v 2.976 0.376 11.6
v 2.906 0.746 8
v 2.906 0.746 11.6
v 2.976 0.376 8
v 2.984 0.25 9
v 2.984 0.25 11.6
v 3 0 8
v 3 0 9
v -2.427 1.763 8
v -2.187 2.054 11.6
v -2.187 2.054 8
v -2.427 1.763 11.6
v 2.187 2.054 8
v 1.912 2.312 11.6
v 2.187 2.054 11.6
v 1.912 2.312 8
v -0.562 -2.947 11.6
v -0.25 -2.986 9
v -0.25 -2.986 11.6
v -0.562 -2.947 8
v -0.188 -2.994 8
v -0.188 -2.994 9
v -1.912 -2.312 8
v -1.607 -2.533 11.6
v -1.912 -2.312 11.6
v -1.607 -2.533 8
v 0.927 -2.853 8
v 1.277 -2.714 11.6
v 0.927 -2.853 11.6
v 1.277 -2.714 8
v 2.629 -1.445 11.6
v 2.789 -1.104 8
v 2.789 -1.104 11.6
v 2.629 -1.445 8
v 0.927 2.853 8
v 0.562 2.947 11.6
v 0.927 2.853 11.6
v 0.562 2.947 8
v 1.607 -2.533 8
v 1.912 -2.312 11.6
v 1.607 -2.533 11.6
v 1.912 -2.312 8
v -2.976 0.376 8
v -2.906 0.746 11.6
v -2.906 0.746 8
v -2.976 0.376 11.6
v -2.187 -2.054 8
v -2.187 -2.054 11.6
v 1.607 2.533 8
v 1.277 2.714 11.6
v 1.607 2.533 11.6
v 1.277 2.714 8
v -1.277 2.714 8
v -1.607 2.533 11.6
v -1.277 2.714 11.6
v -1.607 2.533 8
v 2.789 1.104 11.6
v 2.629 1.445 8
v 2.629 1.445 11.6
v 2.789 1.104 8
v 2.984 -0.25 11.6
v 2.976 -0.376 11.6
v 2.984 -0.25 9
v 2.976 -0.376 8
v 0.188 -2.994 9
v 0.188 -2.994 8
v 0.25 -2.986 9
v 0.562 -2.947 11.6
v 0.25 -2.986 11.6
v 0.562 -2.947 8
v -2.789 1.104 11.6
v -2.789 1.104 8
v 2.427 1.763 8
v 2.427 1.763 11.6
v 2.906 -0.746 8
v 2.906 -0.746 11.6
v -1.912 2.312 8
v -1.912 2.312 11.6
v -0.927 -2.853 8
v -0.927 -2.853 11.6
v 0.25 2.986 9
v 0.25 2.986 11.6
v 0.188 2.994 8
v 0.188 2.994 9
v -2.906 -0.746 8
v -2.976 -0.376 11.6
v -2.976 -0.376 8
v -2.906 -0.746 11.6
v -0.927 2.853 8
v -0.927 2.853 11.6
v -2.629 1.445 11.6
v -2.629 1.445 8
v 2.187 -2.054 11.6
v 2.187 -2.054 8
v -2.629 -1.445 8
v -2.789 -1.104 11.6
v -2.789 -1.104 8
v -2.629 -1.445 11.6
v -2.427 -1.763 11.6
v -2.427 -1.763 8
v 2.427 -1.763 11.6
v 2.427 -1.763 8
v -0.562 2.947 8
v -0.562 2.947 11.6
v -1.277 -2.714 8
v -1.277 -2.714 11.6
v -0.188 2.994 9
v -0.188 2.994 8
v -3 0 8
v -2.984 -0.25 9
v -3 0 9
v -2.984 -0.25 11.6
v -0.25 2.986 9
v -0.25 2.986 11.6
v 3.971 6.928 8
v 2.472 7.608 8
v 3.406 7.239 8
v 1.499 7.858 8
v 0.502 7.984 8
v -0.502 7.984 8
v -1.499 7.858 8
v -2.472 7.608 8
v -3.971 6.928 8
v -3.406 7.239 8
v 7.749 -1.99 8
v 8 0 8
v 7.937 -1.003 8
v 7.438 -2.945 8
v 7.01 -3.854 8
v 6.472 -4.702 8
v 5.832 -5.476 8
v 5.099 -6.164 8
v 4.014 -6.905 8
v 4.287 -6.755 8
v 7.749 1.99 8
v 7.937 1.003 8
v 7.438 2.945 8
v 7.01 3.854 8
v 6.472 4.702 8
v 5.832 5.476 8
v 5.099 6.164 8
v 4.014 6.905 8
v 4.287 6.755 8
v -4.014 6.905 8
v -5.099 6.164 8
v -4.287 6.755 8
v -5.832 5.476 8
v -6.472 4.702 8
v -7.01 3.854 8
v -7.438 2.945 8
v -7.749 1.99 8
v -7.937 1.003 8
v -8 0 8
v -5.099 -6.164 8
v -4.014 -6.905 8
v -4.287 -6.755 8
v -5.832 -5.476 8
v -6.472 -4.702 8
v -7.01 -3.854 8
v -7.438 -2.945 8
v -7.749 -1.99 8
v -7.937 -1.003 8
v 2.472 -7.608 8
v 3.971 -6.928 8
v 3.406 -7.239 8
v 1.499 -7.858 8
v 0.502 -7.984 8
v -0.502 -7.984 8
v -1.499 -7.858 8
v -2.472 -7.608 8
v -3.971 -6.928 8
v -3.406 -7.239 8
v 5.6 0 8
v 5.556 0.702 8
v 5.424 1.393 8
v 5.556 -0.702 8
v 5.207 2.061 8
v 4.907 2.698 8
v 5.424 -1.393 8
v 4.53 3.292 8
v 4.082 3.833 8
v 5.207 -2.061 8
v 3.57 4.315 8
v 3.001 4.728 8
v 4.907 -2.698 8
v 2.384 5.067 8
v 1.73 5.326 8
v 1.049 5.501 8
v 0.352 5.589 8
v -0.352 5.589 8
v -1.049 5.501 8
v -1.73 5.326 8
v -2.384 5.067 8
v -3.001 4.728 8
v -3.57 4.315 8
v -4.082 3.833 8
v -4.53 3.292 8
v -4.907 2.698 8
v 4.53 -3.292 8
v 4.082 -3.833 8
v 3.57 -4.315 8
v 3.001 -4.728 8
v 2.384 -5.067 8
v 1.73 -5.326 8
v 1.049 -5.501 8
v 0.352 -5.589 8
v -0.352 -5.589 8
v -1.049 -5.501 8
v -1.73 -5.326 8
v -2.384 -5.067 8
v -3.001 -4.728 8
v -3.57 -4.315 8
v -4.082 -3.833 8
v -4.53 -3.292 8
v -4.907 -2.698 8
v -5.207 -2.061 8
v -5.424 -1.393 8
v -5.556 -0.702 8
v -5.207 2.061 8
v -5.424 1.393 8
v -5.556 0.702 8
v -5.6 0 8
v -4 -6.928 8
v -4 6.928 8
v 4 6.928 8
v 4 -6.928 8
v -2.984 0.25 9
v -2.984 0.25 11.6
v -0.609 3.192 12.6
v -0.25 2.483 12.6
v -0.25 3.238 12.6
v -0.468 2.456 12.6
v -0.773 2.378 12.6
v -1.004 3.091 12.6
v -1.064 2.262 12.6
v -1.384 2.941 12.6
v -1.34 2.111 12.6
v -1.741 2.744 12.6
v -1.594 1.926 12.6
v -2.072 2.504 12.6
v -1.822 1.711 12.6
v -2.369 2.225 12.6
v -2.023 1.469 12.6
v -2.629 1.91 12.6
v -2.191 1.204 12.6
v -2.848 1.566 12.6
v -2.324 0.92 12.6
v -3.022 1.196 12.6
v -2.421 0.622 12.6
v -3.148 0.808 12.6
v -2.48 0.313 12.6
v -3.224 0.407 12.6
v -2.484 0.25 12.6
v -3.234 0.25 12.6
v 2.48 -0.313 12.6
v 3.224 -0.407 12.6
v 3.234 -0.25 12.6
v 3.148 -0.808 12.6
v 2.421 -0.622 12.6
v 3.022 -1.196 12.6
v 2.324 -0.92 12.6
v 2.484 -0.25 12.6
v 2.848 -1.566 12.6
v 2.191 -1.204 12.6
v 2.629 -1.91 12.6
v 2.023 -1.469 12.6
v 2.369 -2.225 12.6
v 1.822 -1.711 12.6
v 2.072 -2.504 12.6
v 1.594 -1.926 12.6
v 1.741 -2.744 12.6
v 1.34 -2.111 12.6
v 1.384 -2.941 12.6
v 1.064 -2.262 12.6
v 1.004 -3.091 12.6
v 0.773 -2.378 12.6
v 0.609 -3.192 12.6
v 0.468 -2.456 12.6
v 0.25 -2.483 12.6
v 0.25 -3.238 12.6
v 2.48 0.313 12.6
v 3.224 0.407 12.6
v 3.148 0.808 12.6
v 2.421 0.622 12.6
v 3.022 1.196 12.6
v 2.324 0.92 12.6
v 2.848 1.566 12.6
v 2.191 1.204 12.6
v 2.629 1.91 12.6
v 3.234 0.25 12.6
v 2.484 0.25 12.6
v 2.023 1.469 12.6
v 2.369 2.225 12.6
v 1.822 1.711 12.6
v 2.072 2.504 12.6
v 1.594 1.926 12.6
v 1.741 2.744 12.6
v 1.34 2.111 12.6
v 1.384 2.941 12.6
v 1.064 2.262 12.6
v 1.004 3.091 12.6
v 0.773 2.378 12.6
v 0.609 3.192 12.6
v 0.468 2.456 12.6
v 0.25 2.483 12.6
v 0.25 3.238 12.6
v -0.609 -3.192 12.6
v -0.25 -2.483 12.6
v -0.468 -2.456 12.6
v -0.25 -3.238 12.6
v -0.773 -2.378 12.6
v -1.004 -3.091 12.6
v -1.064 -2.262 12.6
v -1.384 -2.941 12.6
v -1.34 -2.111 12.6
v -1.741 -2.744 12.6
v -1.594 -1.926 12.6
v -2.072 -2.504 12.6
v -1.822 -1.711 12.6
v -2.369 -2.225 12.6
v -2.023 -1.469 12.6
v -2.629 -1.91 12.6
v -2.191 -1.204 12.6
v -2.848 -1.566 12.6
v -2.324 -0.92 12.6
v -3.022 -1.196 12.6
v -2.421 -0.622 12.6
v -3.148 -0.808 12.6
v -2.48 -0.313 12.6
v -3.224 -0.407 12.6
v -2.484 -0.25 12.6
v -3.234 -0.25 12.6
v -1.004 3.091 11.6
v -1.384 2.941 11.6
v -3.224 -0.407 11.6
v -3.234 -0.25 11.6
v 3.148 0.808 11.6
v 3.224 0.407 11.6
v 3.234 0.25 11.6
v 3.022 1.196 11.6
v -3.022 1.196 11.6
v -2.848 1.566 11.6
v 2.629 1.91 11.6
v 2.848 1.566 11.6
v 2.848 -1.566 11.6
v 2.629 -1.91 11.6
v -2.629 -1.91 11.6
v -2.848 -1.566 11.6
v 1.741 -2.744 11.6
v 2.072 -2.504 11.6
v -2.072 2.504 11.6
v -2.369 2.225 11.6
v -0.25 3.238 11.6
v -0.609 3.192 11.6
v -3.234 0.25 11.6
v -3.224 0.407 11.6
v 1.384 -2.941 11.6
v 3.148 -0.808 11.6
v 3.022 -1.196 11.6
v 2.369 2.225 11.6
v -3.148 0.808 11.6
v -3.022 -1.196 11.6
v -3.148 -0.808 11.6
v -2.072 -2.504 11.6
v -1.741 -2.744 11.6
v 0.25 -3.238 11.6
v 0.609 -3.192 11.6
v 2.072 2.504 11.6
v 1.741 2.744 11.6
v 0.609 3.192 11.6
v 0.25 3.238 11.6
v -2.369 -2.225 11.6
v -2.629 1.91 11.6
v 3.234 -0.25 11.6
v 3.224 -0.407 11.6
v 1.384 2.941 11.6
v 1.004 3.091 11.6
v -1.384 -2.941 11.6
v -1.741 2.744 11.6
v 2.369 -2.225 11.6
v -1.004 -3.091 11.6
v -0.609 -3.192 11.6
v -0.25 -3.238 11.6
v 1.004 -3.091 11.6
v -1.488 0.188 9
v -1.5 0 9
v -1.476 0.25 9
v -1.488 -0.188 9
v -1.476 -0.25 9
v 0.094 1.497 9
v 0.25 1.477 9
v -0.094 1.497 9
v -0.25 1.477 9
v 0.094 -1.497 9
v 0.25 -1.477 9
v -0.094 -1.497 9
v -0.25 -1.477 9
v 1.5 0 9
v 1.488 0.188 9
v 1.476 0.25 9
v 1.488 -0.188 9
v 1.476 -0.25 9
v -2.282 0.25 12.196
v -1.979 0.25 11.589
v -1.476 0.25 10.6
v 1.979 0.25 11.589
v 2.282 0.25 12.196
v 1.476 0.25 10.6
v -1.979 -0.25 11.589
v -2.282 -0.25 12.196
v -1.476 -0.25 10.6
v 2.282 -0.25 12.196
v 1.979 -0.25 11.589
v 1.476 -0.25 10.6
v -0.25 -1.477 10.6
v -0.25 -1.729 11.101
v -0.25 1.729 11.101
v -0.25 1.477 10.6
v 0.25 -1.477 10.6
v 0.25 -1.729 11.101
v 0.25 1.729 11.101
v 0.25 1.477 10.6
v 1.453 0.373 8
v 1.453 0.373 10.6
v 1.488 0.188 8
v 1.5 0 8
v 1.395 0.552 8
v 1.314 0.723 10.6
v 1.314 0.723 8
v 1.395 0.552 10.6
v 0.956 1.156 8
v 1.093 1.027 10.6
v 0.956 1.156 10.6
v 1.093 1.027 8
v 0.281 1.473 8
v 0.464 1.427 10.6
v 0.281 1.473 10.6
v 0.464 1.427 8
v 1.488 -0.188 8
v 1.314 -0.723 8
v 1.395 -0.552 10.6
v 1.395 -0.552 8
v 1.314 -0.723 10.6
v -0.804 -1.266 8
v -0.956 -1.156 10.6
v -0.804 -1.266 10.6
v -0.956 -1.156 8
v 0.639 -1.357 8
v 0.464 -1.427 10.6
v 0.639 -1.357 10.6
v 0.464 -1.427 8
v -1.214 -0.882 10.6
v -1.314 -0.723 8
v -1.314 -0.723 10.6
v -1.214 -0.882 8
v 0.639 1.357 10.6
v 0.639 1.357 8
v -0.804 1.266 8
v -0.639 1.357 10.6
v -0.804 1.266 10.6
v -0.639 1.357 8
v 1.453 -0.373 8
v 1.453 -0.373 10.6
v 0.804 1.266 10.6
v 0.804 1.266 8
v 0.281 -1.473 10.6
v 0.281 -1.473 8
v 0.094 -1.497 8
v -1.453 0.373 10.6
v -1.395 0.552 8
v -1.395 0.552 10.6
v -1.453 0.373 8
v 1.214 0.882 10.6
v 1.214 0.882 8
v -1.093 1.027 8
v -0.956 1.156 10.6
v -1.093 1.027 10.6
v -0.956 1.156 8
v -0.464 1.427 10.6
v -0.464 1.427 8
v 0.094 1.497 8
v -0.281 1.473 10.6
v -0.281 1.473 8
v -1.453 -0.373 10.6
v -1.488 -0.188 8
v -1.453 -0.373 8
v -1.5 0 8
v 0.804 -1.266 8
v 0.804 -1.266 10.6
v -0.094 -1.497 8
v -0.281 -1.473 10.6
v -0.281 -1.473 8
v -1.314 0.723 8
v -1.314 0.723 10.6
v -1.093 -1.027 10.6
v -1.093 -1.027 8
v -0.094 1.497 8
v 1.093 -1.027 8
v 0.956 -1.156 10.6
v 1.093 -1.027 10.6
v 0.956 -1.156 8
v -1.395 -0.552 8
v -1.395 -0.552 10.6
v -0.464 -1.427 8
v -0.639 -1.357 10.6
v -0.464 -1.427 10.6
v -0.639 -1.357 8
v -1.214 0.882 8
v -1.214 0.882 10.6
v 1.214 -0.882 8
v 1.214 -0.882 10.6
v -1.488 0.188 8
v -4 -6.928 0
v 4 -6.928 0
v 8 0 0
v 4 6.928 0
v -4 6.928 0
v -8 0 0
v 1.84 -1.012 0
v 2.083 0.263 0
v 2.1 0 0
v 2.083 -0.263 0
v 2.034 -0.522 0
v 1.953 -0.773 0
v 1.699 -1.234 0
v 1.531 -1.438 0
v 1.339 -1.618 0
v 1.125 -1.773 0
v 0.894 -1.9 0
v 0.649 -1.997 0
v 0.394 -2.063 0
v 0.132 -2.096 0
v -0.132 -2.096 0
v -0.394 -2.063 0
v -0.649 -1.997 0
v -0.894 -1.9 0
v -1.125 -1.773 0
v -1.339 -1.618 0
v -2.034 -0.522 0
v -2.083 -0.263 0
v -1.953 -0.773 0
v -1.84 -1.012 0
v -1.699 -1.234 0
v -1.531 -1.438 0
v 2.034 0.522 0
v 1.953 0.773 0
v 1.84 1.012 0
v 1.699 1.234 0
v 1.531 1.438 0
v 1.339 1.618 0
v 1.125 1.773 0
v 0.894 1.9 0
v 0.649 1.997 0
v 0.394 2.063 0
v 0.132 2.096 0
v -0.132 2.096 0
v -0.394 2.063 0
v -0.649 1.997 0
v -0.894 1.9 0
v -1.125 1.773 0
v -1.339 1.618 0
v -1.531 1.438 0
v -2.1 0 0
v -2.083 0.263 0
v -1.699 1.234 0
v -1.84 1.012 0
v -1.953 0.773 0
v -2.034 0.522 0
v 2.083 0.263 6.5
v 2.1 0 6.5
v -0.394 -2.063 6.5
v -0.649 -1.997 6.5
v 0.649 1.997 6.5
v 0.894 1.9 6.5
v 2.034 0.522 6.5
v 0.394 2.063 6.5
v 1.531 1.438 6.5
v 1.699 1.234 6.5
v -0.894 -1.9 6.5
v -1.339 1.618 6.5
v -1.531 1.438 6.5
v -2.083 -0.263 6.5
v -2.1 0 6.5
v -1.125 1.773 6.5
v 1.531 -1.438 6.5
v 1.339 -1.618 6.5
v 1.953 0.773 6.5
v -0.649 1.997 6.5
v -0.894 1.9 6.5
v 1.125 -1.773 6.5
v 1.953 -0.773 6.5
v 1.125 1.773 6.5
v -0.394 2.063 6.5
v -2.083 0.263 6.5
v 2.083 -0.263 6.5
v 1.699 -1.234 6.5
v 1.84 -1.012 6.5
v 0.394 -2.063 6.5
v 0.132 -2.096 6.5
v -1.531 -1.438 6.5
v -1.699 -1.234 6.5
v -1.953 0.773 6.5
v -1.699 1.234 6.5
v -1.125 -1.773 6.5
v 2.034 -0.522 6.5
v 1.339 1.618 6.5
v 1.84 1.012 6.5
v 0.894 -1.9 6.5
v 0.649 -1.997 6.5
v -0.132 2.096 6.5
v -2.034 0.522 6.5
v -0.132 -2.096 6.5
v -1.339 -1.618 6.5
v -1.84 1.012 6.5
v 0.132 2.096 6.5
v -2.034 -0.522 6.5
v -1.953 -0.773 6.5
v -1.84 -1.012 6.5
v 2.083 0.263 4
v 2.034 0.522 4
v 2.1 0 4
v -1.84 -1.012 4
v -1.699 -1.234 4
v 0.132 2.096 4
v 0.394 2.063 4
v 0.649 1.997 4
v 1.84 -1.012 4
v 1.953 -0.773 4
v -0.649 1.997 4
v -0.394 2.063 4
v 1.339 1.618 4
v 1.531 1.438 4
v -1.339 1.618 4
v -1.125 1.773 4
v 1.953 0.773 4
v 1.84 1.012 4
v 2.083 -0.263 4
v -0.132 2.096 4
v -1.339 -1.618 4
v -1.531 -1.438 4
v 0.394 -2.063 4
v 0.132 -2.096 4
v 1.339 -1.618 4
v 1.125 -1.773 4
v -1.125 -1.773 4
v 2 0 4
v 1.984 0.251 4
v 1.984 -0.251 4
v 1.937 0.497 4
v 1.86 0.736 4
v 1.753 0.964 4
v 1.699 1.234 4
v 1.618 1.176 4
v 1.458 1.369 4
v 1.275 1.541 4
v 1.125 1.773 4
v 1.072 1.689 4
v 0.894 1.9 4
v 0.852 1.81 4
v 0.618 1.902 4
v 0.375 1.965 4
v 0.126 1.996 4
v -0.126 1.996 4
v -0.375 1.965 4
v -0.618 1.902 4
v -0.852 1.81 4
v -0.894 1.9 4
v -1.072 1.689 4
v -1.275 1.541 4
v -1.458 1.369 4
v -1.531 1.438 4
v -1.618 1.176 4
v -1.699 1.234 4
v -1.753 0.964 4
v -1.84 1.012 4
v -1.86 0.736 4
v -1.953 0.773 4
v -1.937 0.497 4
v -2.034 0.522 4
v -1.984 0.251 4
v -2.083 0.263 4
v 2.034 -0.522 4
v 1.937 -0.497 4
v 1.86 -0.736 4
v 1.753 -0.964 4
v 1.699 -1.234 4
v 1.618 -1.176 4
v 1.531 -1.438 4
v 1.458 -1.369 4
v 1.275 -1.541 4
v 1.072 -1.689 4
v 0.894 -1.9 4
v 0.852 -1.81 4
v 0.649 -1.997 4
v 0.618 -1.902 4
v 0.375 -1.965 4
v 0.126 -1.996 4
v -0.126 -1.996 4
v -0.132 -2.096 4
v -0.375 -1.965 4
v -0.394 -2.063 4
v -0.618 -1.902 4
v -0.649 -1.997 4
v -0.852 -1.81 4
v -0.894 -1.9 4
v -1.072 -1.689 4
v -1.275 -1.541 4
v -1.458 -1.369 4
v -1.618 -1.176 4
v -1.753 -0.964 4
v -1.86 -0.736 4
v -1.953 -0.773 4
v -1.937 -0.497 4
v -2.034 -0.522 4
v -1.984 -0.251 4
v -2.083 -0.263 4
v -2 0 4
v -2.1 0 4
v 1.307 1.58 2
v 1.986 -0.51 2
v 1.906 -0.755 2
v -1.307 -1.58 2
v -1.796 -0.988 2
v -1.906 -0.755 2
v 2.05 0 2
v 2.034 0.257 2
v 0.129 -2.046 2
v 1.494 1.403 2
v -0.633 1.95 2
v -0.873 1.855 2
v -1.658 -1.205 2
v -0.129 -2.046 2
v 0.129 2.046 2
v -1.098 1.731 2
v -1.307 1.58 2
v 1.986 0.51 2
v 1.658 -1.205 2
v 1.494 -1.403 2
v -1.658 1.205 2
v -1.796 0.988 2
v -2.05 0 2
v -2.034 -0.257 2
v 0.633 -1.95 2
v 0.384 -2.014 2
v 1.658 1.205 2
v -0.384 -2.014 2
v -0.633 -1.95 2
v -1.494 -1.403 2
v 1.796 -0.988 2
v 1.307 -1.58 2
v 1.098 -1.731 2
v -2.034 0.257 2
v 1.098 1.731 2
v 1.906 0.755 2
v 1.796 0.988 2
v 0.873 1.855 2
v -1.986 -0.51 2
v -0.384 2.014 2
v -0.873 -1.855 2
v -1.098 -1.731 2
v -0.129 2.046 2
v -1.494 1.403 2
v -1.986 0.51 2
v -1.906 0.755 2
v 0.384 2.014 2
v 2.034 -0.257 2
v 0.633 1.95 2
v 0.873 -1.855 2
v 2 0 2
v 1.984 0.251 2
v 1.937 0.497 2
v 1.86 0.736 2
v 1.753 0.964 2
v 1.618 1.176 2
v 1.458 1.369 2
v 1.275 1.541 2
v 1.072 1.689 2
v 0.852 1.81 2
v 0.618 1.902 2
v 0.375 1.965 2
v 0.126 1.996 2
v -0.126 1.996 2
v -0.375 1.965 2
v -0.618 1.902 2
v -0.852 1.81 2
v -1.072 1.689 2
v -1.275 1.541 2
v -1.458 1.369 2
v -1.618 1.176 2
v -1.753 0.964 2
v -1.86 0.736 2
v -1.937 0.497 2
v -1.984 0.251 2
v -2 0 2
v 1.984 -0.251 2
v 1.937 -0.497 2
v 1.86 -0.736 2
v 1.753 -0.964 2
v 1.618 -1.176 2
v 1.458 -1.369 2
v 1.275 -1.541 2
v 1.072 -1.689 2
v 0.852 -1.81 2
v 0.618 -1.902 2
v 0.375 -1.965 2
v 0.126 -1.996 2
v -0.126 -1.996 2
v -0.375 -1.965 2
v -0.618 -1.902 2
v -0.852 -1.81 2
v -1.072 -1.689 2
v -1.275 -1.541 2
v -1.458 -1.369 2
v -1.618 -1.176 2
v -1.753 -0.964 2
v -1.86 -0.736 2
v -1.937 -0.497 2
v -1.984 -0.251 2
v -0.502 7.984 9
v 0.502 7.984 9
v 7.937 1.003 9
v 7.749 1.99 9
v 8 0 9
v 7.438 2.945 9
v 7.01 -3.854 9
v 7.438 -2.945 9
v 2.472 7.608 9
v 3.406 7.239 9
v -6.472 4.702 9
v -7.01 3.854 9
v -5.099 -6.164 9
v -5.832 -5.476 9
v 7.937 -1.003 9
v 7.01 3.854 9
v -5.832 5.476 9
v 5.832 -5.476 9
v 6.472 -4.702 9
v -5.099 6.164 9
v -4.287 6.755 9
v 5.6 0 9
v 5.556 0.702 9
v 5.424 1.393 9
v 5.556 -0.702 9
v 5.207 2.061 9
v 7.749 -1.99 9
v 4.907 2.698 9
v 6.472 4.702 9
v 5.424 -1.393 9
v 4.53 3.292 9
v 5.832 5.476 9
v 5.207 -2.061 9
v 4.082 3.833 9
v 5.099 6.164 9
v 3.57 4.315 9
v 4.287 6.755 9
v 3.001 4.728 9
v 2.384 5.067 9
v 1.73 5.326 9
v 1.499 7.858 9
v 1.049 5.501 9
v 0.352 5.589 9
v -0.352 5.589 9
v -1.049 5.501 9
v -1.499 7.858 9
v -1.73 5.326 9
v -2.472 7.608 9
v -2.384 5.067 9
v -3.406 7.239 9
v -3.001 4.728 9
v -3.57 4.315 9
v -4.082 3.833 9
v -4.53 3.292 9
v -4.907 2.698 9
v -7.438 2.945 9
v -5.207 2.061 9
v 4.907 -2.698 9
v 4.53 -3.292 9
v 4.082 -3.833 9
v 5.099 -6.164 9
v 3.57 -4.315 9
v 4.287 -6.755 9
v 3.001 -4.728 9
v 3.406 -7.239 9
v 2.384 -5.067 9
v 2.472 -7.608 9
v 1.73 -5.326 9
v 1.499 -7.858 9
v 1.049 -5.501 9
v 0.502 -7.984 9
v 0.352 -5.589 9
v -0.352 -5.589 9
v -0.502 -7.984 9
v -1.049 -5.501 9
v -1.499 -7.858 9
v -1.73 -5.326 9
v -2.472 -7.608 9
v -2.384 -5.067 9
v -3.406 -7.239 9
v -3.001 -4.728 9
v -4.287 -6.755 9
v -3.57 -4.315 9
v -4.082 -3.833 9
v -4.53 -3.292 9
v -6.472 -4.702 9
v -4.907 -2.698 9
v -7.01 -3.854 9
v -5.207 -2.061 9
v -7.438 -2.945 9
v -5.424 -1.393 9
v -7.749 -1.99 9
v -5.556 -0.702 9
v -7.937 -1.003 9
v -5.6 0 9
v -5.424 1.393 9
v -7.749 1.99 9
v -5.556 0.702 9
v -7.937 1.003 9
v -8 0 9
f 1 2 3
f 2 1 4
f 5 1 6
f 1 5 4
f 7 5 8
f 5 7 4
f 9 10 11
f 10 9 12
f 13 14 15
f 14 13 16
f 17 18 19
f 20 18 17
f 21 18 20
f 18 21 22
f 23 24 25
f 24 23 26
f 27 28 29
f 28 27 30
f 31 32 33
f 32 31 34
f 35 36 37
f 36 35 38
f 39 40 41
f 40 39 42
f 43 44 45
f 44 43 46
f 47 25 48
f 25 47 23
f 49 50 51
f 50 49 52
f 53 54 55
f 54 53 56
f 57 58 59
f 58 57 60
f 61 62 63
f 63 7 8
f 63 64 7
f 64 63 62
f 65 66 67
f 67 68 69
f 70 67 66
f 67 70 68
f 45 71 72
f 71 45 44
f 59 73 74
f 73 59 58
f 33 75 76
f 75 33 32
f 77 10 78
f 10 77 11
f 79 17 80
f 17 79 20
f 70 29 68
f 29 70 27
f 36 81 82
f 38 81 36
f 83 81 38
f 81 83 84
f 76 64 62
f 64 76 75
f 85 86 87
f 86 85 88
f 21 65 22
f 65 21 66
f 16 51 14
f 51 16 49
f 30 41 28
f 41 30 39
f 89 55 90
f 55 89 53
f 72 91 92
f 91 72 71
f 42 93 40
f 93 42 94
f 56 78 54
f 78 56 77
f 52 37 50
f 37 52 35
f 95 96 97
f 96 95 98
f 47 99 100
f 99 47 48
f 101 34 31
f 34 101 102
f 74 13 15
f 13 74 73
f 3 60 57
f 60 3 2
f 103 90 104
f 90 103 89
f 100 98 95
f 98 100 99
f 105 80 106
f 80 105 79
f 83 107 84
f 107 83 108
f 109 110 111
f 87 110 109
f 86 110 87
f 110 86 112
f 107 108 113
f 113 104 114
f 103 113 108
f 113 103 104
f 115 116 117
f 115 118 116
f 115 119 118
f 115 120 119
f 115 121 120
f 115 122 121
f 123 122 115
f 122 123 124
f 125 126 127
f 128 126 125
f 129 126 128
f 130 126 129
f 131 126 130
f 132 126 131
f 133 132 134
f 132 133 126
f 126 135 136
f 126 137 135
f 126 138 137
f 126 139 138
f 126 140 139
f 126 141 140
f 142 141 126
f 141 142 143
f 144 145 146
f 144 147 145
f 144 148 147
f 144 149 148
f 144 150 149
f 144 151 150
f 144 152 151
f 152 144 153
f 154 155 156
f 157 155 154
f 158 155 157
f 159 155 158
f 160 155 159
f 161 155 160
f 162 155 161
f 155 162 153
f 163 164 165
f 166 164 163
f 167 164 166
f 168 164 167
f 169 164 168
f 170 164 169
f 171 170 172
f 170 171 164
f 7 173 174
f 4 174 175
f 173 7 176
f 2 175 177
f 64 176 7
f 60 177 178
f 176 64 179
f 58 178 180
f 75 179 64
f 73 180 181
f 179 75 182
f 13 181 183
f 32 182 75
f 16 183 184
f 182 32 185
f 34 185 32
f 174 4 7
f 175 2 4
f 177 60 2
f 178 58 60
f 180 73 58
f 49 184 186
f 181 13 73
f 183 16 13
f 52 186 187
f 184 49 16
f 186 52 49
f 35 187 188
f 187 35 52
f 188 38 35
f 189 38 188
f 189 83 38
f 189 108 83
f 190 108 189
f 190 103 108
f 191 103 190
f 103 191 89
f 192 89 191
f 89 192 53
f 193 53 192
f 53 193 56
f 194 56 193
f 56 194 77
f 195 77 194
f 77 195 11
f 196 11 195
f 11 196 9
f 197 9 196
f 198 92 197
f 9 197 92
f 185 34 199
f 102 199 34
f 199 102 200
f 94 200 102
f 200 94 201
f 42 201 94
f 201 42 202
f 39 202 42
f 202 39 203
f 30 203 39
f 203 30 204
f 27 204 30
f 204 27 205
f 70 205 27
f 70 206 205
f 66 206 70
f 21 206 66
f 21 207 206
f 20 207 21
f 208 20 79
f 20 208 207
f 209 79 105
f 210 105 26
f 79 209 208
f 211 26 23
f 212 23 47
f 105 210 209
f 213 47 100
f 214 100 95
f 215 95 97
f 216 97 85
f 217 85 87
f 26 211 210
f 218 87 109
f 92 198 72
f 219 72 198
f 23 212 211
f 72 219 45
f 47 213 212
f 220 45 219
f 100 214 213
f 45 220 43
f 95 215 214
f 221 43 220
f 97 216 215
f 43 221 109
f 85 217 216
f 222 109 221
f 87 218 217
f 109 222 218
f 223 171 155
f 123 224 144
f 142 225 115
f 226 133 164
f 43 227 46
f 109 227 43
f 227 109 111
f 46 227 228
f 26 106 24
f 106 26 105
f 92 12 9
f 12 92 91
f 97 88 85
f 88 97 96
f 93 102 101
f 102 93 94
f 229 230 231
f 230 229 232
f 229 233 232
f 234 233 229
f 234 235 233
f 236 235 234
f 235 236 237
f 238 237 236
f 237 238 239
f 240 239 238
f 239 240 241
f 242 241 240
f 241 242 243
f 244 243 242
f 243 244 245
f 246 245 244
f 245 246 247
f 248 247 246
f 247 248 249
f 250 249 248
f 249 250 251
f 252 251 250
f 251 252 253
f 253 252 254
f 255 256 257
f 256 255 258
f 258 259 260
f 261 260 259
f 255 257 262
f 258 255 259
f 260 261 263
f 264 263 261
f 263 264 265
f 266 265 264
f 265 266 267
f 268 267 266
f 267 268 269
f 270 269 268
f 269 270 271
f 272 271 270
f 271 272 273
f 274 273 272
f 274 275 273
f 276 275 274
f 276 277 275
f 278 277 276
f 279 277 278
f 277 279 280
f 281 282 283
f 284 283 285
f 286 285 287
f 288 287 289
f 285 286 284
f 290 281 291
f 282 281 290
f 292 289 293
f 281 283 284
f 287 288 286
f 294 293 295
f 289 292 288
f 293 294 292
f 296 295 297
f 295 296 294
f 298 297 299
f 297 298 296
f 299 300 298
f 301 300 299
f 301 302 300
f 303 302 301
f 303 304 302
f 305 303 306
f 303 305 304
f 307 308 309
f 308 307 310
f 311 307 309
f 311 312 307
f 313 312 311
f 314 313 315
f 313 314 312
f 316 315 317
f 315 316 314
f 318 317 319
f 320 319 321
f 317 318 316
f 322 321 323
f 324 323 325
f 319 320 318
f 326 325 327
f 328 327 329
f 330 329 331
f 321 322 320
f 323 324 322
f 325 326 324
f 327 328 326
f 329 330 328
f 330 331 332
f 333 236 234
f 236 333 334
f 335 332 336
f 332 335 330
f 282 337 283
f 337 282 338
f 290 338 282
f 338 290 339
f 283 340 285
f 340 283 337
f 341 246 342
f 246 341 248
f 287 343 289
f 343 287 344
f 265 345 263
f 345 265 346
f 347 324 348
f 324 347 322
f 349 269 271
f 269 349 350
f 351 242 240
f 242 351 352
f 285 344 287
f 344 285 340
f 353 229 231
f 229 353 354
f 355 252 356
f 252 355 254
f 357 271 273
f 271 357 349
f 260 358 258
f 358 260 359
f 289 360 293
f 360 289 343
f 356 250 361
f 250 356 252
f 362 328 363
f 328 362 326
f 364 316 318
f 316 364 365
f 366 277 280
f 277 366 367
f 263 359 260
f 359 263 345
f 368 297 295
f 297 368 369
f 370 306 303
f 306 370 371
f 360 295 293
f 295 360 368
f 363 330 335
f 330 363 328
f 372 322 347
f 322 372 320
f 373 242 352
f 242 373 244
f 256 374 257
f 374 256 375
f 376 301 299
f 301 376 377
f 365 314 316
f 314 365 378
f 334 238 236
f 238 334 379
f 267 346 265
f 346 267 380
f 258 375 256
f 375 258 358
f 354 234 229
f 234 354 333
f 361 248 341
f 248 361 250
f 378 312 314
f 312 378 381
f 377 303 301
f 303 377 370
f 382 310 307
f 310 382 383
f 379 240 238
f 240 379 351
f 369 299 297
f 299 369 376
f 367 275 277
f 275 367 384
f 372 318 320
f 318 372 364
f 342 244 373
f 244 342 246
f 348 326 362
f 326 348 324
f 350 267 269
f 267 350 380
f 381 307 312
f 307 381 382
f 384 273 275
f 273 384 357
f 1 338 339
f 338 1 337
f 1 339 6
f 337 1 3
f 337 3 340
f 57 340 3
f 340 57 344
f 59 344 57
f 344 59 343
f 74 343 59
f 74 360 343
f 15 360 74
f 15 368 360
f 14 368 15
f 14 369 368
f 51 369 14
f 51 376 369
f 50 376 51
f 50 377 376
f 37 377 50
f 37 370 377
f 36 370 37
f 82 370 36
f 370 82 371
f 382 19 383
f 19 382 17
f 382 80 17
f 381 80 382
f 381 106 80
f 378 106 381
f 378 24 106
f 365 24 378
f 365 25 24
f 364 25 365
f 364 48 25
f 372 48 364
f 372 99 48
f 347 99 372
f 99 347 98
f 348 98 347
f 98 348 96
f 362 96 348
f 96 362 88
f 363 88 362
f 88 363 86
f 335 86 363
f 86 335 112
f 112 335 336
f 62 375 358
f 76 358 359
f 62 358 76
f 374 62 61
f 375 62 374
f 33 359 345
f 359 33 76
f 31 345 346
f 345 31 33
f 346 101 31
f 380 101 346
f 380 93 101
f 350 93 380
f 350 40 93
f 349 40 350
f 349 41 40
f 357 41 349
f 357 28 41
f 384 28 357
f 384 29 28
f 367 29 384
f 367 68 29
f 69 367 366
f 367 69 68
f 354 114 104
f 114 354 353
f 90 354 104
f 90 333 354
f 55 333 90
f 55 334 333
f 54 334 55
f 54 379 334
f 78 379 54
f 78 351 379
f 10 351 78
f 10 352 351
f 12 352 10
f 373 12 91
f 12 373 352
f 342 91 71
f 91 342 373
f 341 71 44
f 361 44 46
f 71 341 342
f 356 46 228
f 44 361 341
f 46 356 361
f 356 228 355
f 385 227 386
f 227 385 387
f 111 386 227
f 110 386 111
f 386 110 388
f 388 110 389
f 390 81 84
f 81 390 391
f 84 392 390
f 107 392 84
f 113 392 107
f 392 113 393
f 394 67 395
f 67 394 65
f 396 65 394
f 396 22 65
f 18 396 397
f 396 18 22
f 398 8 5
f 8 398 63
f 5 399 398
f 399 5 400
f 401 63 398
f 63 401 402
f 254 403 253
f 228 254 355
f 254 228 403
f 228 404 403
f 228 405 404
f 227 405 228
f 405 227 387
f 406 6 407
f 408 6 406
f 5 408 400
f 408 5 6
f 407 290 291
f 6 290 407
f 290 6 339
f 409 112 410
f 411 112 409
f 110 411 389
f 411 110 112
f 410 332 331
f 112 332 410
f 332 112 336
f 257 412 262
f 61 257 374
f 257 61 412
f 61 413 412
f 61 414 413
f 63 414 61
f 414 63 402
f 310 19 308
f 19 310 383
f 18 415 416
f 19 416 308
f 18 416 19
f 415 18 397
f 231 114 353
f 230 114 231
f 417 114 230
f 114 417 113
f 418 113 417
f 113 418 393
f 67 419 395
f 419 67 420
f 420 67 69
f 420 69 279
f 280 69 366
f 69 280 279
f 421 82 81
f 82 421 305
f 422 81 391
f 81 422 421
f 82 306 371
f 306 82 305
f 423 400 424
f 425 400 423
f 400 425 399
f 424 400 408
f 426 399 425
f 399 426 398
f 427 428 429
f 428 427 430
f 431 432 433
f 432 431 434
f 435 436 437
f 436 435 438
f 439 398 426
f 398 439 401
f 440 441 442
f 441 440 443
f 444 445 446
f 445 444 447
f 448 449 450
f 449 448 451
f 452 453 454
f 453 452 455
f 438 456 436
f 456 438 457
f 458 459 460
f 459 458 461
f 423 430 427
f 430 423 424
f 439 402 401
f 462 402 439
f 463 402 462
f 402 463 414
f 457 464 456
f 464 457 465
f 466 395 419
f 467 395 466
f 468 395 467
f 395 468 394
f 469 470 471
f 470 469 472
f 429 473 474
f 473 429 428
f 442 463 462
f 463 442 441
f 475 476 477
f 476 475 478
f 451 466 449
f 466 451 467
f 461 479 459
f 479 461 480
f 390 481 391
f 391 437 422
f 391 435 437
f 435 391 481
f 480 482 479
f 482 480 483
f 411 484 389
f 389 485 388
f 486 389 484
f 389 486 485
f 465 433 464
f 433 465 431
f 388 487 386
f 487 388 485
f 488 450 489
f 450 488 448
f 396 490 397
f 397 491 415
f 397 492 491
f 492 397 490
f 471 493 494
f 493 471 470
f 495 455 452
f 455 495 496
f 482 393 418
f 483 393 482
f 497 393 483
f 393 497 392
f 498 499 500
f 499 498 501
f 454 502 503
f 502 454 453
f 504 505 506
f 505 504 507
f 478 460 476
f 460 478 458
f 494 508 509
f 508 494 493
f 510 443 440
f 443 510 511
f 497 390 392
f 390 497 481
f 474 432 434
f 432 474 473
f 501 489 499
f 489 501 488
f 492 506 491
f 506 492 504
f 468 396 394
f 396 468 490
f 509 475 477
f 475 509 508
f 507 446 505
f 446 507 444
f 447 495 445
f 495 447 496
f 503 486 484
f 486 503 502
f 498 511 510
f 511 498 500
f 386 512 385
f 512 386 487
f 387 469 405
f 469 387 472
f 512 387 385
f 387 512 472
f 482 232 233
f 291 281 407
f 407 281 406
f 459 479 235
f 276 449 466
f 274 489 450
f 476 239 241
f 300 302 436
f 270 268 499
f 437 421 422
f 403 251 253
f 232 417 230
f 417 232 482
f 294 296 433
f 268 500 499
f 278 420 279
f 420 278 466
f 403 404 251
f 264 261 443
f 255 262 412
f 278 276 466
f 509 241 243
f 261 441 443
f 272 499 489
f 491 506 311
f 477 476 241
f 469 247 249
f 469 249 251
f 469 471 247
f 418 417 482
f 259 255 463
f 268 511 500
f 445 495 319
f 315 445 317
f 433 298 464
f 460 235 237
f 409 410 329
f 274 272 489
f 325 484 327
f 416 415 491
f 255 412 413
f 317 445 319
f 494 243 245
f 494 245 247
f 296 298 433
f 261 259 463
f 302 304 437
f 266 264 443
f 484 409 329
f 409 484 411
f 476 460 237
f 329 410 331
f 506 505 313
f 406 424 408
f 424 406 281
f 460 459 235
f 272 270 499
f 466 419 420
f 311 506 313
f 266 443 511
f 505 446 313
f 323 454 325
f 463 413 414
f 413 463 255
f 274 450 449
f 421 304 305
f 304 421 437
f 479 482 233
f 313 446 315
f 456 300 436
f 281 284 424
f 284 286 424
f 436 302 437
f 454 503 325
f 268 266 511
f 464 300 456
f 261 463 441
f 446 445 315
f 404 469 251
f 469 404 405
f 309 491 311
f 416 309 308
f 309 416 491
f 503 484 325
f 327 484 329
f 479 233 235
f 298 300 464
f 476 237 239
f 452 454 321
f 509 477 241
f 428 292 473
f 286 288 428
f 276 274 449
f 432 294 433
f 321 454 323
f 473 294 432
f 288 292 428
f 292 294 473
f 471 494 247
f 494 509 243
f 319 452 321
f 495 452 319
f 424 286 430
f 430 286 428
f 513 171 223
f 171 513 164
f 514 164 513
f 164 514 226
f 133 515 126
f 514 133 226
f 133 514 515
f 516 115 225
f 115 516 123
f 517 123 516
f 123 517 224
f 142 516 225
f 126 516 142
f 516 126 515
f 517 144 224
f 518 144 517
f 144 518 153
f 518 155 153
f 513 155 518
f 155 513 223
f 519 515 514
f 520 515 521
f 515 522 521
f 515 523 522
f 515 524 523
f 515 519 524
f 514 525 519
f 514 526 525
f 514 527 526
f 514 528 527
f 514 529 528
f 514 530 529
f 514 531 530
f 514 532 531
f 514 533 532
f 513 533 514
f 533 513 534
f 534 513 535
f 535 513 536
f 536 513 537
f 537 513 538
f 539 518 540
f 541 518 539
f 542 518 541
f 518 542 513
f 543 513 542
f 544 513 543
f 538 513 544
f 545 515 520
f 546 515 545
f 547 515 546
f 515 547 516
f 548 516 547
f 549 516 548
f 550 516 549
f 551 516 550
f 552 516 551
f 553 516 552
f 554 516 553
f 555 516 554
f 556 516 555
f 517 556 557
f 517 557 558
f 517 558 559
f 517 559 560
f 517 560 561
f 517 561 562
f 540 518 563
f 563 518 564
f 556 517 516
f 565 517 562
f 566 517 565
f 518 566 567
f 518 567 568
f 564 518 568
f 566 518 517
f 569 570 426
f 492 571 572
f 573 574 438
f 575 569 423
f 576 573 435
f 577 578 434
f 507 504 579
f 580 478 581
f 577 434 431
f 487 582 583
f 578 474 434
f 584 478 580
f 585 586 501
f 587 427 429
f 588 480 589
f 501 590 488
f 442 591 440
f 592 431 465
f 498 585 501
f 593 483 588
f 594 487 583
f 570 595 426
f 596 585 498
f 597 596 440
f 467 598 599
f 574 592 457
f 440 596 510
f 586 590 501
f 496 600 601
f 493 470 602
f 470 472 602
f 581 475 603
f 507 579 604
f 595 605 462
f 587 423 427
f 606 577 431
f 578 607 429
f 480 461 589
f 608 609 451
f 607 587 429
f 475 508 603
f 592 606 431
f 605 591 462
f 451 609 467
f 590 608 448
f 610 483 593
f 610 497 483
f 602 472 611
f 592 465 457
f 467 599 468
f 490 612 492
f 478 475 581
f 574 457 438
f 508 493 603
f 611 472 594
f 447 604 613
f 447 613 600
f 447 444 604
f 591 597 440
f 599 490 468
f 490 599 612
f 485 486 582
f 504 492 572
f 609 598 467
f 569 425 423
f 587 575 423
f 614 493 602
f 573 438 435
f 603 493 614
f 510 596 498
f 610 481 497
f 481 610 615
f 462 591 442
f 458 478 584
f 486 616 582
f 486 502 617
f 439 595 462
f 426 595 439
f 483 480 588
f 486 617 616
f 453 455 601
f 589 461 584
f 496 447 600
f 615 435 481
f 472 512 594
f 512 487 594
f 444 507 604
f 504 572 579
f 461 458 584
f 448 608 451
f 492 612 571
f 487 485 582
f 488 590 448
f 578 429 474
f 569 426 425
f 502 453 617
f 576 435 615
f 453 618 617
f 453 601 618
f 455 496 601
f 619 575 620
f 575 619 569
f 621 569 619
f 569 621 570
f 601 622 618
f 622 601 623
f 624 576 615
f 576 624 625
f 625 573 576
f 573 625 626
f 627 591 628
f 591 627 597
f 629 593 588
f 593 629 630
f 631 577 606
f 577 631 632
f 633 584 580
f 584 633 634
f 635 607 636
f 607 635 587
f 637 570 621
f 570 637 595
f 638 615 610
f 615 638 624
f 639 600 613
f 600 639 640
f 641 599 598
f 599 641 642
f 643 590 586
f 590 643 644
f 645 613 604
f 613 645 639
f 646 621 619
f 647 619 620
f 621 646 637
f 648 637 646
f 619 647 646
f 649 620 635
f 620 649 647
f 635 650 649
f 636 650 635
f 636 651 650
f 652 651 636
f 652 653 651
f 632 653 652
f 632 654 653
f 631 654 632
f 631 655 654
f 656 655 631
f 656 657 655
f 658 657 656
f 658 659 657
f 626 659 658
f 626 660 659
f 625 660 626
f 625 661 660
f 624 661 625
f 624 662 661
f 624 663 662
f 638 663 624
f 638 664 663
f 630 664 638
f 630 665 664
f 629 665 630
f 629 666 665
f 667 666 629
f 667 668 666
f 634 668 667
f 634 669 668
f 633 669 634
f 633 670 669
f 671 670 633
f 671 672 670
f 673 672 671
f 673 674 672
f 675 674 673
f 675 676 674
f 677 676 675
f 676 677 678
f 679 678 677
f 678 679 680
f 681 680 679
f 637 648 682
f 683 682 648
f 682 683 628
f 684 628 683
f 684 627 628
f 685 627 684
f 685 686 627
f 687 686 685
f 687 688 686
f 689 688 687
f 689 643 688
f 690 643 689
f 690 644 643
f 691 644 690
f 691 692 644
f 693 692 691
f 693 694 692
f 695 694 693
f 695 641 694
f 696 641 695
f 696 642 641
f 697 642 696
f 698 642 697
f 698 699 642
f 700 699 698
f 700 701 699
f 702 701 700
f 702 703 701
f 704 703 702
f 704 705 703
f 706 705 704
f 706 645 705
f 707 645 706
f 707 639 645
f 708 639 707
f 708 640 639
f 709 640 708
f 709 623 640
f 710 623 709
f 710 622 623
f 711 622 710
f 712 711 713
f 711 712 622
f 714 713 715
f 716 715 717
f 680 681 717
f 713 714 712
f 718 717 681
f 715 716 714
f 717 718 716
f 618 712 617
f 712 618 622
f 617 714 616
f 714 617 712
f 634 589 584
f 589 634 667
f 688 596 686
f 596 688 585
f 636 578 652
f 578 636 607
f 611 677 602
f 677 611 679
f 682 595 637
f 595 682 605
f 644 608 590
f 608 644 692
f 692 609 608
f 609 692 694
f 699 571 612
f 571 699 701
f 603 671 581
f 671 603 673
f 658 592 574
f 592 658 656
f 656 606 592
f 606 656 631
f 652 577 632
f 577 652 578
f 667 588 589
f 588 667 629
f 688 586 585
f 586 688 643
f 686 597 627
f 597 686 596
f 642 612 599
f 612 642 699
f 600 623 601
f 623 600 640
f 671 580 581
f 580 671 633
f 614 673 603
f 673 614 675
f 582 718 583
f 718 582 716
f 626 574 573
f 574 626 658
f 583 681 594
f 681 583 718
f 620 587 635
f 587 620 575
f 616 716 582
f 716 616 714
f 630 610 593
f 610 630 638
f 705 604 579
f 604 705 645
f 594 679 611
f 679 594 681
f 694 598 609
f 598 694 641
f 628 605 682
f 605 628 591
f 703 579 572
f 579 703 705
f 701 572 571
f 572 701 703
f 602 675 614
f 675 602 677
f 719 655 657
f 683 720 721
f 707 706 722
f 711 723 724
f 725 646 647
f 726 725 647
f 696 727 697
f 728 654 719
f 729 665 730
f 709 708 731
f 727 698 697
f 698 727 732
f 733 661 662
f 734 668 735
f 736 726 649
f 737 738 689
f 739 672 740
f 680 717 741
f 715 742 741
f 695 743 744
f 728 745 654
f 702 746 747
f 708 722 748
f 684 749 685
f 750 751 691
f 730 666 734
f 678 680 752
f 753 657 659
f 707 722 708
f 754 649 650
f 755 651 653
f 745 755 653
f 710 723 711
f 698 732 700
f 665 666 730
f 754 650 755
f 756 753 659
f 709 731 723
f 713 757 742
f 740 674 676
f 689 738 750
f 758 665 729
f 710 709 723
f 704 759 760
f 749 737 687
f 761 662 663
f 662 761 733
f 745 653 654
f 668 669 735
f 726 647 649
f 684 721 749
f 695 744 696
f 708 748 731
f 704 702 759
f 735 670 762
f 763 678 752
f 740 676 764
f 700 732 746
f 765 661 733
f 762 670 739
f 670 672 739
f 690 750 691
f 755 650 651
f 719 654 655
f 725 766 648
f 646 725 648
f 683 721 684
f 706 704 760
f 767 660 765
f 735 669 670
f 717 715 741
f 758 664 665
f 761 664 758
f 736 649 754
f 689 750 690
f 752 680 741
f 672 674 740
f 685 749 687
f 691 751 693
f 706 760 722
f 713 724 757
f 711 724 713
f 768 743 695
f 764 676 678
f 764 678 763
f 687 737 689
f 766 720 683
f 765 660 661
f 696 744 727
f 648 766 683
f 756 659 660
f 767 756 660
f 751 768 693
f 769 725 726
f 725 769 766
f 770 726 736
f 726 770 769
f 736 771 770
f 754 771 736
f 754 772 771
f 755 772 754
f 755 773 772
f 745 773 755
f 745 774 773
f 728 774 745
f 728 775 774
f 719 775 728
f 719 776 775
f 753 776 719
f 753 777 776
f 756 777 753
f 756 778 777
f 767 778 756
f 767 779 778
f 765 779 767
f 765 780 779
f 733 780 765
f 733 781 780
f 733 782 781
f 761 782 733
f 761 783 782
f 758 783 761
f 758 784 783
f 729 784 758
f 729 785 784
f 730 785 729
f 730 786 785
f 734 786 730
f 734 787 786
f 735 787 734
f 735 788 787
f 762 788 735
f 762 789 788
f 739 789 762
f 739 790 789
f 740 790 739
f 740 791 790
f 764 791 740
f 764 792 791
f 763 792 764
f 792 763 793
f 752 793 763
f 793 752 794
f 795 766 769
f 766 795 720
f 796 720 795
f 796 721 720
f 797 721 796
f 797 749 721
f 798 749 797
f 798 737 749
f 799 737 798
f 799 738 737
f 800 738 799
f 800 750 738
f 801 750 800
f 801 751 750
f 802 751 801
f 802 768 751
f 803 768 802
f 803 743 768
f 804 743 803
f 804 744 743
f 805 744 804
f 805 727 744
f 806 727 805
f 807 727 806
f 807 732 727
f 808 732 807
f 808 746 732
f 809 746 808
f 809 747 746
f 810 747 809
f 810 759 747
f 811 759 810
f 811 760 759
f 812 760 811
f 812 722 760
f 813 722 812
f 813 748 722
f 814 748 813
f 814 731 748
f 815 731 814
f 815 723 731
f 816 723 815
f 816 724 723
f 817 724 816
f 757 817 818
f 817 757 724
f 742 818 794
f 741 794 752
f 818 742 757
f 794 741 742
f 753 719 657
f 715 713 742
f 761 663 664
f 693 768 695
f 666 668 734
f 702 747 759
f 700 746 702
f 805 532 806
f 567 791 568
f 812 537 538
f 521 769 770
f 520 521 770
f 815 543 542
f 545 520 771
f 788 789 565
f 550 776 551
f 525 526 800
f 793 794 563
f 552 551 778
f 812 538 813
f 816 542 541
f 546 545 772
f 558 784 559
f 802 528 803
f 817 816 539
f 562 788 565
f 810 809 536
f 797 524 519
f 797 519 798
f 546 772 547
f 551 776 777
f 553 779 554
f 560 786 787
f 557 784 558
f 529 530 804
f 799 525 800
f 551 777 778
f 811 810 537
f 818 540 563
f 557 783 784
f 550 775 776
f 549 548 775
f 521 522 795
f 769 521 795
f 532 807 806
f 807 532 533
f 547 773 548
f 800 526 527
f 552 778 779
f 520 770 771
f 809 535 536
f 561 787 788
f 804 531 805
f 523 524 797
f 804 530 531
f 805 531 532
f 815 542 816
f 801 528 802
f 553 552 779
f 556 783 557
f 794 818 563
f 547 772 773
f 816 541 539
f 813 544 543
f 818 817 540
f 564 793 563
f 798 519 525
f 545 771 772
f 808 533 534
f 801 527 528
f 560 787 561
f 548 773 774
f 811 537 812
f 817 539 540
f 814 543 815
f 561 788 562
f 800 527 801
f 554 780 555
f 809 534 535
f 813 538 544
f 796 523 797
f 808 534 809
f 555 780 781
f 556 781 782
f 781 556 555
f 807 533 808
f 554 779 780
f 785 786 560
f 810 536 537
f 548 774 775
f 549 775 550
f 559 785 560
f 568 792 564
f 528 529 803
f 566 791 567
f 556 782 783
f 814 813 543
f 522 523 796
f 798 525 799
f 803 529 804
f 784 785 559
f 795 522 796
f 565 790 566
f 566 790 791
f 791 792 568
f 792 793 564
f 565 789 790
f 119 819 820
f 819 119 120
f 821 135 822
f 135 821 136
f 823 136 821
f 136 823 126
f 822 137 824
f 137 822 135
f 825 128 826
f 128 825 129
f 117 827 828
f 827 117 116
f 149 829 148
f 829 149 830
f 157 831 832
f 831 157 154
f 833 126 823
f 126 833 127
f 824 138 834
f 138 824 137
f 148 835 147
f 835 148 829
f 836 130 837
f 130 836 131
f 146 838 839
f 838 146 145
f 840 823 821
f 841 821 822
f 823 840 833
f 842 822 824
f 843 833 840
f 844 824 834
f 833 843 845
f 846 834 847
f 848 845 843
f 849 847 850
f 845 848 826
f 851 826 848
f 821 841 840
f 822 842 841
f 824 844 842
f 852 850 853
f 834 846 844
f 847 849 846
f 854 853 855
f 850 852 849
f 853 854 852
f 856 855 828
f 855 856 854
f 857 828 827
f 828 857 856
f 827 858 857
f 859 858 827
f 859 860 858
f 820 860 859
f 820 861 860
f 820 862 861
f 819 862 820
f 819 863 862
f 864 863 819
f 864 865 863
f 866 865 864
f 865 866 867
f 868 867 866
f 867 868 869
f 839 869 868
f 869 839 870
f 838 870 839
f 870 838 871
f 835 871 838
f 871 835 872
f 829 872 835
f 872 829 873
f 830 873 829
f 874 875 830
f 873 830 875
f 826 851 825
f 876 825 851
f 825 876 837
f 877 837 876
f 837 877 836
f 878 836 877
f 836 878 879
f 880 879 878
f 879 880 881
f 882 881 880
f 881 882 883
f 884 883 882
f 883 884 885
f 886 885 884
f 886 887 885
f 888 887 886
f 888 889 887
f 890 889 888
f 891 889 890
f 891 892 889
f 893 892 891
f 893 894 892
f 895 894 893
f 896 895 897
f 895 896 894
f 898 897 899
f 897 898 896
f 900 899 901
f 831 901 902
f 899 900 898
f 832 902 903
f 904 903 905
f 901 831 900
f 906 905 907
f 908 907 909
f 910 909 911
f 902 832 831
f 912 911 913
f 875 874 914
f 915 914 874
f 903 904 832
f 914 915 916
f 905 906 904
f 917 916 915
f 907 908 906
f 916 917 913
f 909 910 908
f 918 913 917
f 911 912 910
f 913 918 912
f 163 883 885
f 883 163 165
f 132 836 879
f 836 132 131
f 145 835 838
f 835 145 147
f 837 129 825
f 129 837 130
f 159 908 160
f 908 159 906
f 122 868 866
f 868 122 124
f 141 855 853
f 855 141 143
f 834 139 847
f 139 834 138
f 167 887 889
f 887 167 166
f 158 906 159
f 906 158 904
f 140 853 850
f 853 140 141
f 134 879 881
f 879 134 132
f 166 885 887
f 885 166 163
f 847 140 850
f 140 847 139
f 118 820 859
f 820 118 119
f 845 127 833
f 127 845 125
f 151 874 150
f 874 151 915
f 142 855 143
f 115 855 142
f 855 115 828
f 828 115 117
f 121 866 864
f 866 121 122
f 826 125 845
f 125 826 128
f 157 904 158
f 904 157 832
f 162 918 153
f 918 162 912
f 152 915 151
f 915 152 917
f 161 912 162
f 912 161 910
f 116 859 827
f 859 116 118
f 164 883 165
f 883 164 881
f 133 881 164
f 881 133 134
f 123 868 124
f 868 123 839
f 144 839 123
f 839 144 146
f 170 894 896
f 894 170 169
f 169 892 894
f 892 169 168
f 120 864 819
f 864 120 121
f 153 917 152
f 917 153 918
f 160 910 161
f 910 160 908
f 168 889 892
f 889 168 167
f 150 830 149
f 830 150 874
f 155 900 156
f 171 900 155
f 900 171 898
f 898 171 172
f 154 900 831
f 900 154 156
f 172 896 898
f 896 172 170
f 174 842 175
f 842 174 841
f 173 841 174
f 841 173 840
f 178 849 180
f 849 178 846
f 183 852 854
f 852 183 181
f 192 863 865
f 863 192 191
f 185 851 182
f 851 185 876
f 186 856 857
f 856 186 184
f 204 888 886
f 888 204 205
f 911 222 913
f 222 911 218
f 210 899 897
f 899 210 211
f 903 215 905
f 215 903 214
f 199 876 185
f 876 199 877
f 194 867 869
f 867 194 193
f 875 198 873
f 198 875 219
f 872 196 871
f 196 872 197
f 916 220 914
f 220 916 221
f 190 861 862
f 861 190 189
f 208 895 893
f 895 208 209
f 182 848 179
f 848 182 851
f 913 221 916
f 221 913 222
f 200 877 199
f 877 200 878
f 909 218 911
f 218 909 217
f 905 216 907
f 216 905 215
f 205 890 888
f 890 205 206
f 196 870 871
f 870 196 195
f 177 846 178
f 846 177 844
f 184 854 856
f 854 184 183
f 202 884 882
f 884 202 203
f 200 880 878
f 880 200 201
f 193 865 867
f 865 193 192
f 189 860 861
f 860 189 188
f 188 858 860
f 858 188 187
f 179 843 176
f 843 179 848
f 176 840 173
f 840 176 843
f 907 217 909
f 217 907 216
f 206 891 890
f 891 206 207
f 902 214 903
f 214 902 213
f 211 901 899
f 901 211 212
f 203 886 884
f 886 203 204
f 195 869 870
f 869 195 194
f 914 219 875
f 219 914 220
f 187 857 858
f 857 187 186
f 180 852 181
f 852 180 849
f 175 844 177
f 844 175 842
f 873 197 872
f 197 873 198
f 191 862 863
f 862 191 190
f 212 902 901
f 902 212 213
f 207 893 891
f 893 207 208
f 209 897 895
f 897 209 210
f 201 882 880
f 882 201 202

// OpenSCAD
module adapter_grommet(filament_r=1.5) {

     grommet_id = 6;
     grommet_thick = 3.6;

     pin_length = grommet_thick;

     pin_or = grommet_id / 2;
     pin_ir = pin_or - 1.5;
     bump_or = pin_or + 0.25;

     $fn = 50;

     difference() {
	  // outer shape of pin, with bump on rim
	  union() {
	       cylinder(pin_length + 1, r=3);
	       translate([0, 0, pin_length]) {
		    cylinder(1, r=bump_or);
	       };
	  }

	  // slots for relief
	  translate([0, 0, 4]) {
	       cube([10, 0.5, 6], center=true);

	       rotate([0, 0, 90]) {
		    cube([10, 0.5, 6], center=true);
	       };
	  };

	  cylinder(pin_length + 1, r=filament_r);
	  translate([0, 0, pin_length - 1]) {
	       cylinder(2, filament_r, pin_or - 0.5);
	  };
     };
}


module adapter_tube(tubing_od=4.1, pinch=0.1, filament_r=1.5) {

     hole_r = tubing_od / 2;
     squeeze_r = hole_r - (pinch / 2);
     spacious_r = hole_r + (pinch / 2);

     $fn = 50;

     difference() {
	  // I like the look of a hex nut for the body of the adapter
	  cylinder(8, r=8, $fn=6);

	  // upper ceiling contracts to the grommet adapter size
	  translate([0, 0, 6.5]) {
	       cylinder(1.5, spacious_r, filament_r);
	  };

	  // main space
	  translate([0, 0, 4]) {
	       cylinder(2.5, r=spacious_r);
	  };

	  // inner flange
	  translate([0, 0, 2]) {
	       cylinder(2, hole_r, squeeze_r);
	  };

	  // bottom flange
	  cylinder(2, spacious_r, squeeze_r);
     };

     // a little ring that fits over the protrusion of the grommet
     translate([0, 0, 8]) {
	  difference() {
	       cylinder(1, r=8);
	       translate([0, 0, -1]) {
		    cylinder(3, r=5.6);
	       };
	  };
     };
}


module adapter(tubing_od=4.1) {
     union() {
	  translate([0, 0, 8]) {
	       adapter_grommet();
	  };
	  adapter_tube(tubing_od);
     };
}


adapter();


// The end.
